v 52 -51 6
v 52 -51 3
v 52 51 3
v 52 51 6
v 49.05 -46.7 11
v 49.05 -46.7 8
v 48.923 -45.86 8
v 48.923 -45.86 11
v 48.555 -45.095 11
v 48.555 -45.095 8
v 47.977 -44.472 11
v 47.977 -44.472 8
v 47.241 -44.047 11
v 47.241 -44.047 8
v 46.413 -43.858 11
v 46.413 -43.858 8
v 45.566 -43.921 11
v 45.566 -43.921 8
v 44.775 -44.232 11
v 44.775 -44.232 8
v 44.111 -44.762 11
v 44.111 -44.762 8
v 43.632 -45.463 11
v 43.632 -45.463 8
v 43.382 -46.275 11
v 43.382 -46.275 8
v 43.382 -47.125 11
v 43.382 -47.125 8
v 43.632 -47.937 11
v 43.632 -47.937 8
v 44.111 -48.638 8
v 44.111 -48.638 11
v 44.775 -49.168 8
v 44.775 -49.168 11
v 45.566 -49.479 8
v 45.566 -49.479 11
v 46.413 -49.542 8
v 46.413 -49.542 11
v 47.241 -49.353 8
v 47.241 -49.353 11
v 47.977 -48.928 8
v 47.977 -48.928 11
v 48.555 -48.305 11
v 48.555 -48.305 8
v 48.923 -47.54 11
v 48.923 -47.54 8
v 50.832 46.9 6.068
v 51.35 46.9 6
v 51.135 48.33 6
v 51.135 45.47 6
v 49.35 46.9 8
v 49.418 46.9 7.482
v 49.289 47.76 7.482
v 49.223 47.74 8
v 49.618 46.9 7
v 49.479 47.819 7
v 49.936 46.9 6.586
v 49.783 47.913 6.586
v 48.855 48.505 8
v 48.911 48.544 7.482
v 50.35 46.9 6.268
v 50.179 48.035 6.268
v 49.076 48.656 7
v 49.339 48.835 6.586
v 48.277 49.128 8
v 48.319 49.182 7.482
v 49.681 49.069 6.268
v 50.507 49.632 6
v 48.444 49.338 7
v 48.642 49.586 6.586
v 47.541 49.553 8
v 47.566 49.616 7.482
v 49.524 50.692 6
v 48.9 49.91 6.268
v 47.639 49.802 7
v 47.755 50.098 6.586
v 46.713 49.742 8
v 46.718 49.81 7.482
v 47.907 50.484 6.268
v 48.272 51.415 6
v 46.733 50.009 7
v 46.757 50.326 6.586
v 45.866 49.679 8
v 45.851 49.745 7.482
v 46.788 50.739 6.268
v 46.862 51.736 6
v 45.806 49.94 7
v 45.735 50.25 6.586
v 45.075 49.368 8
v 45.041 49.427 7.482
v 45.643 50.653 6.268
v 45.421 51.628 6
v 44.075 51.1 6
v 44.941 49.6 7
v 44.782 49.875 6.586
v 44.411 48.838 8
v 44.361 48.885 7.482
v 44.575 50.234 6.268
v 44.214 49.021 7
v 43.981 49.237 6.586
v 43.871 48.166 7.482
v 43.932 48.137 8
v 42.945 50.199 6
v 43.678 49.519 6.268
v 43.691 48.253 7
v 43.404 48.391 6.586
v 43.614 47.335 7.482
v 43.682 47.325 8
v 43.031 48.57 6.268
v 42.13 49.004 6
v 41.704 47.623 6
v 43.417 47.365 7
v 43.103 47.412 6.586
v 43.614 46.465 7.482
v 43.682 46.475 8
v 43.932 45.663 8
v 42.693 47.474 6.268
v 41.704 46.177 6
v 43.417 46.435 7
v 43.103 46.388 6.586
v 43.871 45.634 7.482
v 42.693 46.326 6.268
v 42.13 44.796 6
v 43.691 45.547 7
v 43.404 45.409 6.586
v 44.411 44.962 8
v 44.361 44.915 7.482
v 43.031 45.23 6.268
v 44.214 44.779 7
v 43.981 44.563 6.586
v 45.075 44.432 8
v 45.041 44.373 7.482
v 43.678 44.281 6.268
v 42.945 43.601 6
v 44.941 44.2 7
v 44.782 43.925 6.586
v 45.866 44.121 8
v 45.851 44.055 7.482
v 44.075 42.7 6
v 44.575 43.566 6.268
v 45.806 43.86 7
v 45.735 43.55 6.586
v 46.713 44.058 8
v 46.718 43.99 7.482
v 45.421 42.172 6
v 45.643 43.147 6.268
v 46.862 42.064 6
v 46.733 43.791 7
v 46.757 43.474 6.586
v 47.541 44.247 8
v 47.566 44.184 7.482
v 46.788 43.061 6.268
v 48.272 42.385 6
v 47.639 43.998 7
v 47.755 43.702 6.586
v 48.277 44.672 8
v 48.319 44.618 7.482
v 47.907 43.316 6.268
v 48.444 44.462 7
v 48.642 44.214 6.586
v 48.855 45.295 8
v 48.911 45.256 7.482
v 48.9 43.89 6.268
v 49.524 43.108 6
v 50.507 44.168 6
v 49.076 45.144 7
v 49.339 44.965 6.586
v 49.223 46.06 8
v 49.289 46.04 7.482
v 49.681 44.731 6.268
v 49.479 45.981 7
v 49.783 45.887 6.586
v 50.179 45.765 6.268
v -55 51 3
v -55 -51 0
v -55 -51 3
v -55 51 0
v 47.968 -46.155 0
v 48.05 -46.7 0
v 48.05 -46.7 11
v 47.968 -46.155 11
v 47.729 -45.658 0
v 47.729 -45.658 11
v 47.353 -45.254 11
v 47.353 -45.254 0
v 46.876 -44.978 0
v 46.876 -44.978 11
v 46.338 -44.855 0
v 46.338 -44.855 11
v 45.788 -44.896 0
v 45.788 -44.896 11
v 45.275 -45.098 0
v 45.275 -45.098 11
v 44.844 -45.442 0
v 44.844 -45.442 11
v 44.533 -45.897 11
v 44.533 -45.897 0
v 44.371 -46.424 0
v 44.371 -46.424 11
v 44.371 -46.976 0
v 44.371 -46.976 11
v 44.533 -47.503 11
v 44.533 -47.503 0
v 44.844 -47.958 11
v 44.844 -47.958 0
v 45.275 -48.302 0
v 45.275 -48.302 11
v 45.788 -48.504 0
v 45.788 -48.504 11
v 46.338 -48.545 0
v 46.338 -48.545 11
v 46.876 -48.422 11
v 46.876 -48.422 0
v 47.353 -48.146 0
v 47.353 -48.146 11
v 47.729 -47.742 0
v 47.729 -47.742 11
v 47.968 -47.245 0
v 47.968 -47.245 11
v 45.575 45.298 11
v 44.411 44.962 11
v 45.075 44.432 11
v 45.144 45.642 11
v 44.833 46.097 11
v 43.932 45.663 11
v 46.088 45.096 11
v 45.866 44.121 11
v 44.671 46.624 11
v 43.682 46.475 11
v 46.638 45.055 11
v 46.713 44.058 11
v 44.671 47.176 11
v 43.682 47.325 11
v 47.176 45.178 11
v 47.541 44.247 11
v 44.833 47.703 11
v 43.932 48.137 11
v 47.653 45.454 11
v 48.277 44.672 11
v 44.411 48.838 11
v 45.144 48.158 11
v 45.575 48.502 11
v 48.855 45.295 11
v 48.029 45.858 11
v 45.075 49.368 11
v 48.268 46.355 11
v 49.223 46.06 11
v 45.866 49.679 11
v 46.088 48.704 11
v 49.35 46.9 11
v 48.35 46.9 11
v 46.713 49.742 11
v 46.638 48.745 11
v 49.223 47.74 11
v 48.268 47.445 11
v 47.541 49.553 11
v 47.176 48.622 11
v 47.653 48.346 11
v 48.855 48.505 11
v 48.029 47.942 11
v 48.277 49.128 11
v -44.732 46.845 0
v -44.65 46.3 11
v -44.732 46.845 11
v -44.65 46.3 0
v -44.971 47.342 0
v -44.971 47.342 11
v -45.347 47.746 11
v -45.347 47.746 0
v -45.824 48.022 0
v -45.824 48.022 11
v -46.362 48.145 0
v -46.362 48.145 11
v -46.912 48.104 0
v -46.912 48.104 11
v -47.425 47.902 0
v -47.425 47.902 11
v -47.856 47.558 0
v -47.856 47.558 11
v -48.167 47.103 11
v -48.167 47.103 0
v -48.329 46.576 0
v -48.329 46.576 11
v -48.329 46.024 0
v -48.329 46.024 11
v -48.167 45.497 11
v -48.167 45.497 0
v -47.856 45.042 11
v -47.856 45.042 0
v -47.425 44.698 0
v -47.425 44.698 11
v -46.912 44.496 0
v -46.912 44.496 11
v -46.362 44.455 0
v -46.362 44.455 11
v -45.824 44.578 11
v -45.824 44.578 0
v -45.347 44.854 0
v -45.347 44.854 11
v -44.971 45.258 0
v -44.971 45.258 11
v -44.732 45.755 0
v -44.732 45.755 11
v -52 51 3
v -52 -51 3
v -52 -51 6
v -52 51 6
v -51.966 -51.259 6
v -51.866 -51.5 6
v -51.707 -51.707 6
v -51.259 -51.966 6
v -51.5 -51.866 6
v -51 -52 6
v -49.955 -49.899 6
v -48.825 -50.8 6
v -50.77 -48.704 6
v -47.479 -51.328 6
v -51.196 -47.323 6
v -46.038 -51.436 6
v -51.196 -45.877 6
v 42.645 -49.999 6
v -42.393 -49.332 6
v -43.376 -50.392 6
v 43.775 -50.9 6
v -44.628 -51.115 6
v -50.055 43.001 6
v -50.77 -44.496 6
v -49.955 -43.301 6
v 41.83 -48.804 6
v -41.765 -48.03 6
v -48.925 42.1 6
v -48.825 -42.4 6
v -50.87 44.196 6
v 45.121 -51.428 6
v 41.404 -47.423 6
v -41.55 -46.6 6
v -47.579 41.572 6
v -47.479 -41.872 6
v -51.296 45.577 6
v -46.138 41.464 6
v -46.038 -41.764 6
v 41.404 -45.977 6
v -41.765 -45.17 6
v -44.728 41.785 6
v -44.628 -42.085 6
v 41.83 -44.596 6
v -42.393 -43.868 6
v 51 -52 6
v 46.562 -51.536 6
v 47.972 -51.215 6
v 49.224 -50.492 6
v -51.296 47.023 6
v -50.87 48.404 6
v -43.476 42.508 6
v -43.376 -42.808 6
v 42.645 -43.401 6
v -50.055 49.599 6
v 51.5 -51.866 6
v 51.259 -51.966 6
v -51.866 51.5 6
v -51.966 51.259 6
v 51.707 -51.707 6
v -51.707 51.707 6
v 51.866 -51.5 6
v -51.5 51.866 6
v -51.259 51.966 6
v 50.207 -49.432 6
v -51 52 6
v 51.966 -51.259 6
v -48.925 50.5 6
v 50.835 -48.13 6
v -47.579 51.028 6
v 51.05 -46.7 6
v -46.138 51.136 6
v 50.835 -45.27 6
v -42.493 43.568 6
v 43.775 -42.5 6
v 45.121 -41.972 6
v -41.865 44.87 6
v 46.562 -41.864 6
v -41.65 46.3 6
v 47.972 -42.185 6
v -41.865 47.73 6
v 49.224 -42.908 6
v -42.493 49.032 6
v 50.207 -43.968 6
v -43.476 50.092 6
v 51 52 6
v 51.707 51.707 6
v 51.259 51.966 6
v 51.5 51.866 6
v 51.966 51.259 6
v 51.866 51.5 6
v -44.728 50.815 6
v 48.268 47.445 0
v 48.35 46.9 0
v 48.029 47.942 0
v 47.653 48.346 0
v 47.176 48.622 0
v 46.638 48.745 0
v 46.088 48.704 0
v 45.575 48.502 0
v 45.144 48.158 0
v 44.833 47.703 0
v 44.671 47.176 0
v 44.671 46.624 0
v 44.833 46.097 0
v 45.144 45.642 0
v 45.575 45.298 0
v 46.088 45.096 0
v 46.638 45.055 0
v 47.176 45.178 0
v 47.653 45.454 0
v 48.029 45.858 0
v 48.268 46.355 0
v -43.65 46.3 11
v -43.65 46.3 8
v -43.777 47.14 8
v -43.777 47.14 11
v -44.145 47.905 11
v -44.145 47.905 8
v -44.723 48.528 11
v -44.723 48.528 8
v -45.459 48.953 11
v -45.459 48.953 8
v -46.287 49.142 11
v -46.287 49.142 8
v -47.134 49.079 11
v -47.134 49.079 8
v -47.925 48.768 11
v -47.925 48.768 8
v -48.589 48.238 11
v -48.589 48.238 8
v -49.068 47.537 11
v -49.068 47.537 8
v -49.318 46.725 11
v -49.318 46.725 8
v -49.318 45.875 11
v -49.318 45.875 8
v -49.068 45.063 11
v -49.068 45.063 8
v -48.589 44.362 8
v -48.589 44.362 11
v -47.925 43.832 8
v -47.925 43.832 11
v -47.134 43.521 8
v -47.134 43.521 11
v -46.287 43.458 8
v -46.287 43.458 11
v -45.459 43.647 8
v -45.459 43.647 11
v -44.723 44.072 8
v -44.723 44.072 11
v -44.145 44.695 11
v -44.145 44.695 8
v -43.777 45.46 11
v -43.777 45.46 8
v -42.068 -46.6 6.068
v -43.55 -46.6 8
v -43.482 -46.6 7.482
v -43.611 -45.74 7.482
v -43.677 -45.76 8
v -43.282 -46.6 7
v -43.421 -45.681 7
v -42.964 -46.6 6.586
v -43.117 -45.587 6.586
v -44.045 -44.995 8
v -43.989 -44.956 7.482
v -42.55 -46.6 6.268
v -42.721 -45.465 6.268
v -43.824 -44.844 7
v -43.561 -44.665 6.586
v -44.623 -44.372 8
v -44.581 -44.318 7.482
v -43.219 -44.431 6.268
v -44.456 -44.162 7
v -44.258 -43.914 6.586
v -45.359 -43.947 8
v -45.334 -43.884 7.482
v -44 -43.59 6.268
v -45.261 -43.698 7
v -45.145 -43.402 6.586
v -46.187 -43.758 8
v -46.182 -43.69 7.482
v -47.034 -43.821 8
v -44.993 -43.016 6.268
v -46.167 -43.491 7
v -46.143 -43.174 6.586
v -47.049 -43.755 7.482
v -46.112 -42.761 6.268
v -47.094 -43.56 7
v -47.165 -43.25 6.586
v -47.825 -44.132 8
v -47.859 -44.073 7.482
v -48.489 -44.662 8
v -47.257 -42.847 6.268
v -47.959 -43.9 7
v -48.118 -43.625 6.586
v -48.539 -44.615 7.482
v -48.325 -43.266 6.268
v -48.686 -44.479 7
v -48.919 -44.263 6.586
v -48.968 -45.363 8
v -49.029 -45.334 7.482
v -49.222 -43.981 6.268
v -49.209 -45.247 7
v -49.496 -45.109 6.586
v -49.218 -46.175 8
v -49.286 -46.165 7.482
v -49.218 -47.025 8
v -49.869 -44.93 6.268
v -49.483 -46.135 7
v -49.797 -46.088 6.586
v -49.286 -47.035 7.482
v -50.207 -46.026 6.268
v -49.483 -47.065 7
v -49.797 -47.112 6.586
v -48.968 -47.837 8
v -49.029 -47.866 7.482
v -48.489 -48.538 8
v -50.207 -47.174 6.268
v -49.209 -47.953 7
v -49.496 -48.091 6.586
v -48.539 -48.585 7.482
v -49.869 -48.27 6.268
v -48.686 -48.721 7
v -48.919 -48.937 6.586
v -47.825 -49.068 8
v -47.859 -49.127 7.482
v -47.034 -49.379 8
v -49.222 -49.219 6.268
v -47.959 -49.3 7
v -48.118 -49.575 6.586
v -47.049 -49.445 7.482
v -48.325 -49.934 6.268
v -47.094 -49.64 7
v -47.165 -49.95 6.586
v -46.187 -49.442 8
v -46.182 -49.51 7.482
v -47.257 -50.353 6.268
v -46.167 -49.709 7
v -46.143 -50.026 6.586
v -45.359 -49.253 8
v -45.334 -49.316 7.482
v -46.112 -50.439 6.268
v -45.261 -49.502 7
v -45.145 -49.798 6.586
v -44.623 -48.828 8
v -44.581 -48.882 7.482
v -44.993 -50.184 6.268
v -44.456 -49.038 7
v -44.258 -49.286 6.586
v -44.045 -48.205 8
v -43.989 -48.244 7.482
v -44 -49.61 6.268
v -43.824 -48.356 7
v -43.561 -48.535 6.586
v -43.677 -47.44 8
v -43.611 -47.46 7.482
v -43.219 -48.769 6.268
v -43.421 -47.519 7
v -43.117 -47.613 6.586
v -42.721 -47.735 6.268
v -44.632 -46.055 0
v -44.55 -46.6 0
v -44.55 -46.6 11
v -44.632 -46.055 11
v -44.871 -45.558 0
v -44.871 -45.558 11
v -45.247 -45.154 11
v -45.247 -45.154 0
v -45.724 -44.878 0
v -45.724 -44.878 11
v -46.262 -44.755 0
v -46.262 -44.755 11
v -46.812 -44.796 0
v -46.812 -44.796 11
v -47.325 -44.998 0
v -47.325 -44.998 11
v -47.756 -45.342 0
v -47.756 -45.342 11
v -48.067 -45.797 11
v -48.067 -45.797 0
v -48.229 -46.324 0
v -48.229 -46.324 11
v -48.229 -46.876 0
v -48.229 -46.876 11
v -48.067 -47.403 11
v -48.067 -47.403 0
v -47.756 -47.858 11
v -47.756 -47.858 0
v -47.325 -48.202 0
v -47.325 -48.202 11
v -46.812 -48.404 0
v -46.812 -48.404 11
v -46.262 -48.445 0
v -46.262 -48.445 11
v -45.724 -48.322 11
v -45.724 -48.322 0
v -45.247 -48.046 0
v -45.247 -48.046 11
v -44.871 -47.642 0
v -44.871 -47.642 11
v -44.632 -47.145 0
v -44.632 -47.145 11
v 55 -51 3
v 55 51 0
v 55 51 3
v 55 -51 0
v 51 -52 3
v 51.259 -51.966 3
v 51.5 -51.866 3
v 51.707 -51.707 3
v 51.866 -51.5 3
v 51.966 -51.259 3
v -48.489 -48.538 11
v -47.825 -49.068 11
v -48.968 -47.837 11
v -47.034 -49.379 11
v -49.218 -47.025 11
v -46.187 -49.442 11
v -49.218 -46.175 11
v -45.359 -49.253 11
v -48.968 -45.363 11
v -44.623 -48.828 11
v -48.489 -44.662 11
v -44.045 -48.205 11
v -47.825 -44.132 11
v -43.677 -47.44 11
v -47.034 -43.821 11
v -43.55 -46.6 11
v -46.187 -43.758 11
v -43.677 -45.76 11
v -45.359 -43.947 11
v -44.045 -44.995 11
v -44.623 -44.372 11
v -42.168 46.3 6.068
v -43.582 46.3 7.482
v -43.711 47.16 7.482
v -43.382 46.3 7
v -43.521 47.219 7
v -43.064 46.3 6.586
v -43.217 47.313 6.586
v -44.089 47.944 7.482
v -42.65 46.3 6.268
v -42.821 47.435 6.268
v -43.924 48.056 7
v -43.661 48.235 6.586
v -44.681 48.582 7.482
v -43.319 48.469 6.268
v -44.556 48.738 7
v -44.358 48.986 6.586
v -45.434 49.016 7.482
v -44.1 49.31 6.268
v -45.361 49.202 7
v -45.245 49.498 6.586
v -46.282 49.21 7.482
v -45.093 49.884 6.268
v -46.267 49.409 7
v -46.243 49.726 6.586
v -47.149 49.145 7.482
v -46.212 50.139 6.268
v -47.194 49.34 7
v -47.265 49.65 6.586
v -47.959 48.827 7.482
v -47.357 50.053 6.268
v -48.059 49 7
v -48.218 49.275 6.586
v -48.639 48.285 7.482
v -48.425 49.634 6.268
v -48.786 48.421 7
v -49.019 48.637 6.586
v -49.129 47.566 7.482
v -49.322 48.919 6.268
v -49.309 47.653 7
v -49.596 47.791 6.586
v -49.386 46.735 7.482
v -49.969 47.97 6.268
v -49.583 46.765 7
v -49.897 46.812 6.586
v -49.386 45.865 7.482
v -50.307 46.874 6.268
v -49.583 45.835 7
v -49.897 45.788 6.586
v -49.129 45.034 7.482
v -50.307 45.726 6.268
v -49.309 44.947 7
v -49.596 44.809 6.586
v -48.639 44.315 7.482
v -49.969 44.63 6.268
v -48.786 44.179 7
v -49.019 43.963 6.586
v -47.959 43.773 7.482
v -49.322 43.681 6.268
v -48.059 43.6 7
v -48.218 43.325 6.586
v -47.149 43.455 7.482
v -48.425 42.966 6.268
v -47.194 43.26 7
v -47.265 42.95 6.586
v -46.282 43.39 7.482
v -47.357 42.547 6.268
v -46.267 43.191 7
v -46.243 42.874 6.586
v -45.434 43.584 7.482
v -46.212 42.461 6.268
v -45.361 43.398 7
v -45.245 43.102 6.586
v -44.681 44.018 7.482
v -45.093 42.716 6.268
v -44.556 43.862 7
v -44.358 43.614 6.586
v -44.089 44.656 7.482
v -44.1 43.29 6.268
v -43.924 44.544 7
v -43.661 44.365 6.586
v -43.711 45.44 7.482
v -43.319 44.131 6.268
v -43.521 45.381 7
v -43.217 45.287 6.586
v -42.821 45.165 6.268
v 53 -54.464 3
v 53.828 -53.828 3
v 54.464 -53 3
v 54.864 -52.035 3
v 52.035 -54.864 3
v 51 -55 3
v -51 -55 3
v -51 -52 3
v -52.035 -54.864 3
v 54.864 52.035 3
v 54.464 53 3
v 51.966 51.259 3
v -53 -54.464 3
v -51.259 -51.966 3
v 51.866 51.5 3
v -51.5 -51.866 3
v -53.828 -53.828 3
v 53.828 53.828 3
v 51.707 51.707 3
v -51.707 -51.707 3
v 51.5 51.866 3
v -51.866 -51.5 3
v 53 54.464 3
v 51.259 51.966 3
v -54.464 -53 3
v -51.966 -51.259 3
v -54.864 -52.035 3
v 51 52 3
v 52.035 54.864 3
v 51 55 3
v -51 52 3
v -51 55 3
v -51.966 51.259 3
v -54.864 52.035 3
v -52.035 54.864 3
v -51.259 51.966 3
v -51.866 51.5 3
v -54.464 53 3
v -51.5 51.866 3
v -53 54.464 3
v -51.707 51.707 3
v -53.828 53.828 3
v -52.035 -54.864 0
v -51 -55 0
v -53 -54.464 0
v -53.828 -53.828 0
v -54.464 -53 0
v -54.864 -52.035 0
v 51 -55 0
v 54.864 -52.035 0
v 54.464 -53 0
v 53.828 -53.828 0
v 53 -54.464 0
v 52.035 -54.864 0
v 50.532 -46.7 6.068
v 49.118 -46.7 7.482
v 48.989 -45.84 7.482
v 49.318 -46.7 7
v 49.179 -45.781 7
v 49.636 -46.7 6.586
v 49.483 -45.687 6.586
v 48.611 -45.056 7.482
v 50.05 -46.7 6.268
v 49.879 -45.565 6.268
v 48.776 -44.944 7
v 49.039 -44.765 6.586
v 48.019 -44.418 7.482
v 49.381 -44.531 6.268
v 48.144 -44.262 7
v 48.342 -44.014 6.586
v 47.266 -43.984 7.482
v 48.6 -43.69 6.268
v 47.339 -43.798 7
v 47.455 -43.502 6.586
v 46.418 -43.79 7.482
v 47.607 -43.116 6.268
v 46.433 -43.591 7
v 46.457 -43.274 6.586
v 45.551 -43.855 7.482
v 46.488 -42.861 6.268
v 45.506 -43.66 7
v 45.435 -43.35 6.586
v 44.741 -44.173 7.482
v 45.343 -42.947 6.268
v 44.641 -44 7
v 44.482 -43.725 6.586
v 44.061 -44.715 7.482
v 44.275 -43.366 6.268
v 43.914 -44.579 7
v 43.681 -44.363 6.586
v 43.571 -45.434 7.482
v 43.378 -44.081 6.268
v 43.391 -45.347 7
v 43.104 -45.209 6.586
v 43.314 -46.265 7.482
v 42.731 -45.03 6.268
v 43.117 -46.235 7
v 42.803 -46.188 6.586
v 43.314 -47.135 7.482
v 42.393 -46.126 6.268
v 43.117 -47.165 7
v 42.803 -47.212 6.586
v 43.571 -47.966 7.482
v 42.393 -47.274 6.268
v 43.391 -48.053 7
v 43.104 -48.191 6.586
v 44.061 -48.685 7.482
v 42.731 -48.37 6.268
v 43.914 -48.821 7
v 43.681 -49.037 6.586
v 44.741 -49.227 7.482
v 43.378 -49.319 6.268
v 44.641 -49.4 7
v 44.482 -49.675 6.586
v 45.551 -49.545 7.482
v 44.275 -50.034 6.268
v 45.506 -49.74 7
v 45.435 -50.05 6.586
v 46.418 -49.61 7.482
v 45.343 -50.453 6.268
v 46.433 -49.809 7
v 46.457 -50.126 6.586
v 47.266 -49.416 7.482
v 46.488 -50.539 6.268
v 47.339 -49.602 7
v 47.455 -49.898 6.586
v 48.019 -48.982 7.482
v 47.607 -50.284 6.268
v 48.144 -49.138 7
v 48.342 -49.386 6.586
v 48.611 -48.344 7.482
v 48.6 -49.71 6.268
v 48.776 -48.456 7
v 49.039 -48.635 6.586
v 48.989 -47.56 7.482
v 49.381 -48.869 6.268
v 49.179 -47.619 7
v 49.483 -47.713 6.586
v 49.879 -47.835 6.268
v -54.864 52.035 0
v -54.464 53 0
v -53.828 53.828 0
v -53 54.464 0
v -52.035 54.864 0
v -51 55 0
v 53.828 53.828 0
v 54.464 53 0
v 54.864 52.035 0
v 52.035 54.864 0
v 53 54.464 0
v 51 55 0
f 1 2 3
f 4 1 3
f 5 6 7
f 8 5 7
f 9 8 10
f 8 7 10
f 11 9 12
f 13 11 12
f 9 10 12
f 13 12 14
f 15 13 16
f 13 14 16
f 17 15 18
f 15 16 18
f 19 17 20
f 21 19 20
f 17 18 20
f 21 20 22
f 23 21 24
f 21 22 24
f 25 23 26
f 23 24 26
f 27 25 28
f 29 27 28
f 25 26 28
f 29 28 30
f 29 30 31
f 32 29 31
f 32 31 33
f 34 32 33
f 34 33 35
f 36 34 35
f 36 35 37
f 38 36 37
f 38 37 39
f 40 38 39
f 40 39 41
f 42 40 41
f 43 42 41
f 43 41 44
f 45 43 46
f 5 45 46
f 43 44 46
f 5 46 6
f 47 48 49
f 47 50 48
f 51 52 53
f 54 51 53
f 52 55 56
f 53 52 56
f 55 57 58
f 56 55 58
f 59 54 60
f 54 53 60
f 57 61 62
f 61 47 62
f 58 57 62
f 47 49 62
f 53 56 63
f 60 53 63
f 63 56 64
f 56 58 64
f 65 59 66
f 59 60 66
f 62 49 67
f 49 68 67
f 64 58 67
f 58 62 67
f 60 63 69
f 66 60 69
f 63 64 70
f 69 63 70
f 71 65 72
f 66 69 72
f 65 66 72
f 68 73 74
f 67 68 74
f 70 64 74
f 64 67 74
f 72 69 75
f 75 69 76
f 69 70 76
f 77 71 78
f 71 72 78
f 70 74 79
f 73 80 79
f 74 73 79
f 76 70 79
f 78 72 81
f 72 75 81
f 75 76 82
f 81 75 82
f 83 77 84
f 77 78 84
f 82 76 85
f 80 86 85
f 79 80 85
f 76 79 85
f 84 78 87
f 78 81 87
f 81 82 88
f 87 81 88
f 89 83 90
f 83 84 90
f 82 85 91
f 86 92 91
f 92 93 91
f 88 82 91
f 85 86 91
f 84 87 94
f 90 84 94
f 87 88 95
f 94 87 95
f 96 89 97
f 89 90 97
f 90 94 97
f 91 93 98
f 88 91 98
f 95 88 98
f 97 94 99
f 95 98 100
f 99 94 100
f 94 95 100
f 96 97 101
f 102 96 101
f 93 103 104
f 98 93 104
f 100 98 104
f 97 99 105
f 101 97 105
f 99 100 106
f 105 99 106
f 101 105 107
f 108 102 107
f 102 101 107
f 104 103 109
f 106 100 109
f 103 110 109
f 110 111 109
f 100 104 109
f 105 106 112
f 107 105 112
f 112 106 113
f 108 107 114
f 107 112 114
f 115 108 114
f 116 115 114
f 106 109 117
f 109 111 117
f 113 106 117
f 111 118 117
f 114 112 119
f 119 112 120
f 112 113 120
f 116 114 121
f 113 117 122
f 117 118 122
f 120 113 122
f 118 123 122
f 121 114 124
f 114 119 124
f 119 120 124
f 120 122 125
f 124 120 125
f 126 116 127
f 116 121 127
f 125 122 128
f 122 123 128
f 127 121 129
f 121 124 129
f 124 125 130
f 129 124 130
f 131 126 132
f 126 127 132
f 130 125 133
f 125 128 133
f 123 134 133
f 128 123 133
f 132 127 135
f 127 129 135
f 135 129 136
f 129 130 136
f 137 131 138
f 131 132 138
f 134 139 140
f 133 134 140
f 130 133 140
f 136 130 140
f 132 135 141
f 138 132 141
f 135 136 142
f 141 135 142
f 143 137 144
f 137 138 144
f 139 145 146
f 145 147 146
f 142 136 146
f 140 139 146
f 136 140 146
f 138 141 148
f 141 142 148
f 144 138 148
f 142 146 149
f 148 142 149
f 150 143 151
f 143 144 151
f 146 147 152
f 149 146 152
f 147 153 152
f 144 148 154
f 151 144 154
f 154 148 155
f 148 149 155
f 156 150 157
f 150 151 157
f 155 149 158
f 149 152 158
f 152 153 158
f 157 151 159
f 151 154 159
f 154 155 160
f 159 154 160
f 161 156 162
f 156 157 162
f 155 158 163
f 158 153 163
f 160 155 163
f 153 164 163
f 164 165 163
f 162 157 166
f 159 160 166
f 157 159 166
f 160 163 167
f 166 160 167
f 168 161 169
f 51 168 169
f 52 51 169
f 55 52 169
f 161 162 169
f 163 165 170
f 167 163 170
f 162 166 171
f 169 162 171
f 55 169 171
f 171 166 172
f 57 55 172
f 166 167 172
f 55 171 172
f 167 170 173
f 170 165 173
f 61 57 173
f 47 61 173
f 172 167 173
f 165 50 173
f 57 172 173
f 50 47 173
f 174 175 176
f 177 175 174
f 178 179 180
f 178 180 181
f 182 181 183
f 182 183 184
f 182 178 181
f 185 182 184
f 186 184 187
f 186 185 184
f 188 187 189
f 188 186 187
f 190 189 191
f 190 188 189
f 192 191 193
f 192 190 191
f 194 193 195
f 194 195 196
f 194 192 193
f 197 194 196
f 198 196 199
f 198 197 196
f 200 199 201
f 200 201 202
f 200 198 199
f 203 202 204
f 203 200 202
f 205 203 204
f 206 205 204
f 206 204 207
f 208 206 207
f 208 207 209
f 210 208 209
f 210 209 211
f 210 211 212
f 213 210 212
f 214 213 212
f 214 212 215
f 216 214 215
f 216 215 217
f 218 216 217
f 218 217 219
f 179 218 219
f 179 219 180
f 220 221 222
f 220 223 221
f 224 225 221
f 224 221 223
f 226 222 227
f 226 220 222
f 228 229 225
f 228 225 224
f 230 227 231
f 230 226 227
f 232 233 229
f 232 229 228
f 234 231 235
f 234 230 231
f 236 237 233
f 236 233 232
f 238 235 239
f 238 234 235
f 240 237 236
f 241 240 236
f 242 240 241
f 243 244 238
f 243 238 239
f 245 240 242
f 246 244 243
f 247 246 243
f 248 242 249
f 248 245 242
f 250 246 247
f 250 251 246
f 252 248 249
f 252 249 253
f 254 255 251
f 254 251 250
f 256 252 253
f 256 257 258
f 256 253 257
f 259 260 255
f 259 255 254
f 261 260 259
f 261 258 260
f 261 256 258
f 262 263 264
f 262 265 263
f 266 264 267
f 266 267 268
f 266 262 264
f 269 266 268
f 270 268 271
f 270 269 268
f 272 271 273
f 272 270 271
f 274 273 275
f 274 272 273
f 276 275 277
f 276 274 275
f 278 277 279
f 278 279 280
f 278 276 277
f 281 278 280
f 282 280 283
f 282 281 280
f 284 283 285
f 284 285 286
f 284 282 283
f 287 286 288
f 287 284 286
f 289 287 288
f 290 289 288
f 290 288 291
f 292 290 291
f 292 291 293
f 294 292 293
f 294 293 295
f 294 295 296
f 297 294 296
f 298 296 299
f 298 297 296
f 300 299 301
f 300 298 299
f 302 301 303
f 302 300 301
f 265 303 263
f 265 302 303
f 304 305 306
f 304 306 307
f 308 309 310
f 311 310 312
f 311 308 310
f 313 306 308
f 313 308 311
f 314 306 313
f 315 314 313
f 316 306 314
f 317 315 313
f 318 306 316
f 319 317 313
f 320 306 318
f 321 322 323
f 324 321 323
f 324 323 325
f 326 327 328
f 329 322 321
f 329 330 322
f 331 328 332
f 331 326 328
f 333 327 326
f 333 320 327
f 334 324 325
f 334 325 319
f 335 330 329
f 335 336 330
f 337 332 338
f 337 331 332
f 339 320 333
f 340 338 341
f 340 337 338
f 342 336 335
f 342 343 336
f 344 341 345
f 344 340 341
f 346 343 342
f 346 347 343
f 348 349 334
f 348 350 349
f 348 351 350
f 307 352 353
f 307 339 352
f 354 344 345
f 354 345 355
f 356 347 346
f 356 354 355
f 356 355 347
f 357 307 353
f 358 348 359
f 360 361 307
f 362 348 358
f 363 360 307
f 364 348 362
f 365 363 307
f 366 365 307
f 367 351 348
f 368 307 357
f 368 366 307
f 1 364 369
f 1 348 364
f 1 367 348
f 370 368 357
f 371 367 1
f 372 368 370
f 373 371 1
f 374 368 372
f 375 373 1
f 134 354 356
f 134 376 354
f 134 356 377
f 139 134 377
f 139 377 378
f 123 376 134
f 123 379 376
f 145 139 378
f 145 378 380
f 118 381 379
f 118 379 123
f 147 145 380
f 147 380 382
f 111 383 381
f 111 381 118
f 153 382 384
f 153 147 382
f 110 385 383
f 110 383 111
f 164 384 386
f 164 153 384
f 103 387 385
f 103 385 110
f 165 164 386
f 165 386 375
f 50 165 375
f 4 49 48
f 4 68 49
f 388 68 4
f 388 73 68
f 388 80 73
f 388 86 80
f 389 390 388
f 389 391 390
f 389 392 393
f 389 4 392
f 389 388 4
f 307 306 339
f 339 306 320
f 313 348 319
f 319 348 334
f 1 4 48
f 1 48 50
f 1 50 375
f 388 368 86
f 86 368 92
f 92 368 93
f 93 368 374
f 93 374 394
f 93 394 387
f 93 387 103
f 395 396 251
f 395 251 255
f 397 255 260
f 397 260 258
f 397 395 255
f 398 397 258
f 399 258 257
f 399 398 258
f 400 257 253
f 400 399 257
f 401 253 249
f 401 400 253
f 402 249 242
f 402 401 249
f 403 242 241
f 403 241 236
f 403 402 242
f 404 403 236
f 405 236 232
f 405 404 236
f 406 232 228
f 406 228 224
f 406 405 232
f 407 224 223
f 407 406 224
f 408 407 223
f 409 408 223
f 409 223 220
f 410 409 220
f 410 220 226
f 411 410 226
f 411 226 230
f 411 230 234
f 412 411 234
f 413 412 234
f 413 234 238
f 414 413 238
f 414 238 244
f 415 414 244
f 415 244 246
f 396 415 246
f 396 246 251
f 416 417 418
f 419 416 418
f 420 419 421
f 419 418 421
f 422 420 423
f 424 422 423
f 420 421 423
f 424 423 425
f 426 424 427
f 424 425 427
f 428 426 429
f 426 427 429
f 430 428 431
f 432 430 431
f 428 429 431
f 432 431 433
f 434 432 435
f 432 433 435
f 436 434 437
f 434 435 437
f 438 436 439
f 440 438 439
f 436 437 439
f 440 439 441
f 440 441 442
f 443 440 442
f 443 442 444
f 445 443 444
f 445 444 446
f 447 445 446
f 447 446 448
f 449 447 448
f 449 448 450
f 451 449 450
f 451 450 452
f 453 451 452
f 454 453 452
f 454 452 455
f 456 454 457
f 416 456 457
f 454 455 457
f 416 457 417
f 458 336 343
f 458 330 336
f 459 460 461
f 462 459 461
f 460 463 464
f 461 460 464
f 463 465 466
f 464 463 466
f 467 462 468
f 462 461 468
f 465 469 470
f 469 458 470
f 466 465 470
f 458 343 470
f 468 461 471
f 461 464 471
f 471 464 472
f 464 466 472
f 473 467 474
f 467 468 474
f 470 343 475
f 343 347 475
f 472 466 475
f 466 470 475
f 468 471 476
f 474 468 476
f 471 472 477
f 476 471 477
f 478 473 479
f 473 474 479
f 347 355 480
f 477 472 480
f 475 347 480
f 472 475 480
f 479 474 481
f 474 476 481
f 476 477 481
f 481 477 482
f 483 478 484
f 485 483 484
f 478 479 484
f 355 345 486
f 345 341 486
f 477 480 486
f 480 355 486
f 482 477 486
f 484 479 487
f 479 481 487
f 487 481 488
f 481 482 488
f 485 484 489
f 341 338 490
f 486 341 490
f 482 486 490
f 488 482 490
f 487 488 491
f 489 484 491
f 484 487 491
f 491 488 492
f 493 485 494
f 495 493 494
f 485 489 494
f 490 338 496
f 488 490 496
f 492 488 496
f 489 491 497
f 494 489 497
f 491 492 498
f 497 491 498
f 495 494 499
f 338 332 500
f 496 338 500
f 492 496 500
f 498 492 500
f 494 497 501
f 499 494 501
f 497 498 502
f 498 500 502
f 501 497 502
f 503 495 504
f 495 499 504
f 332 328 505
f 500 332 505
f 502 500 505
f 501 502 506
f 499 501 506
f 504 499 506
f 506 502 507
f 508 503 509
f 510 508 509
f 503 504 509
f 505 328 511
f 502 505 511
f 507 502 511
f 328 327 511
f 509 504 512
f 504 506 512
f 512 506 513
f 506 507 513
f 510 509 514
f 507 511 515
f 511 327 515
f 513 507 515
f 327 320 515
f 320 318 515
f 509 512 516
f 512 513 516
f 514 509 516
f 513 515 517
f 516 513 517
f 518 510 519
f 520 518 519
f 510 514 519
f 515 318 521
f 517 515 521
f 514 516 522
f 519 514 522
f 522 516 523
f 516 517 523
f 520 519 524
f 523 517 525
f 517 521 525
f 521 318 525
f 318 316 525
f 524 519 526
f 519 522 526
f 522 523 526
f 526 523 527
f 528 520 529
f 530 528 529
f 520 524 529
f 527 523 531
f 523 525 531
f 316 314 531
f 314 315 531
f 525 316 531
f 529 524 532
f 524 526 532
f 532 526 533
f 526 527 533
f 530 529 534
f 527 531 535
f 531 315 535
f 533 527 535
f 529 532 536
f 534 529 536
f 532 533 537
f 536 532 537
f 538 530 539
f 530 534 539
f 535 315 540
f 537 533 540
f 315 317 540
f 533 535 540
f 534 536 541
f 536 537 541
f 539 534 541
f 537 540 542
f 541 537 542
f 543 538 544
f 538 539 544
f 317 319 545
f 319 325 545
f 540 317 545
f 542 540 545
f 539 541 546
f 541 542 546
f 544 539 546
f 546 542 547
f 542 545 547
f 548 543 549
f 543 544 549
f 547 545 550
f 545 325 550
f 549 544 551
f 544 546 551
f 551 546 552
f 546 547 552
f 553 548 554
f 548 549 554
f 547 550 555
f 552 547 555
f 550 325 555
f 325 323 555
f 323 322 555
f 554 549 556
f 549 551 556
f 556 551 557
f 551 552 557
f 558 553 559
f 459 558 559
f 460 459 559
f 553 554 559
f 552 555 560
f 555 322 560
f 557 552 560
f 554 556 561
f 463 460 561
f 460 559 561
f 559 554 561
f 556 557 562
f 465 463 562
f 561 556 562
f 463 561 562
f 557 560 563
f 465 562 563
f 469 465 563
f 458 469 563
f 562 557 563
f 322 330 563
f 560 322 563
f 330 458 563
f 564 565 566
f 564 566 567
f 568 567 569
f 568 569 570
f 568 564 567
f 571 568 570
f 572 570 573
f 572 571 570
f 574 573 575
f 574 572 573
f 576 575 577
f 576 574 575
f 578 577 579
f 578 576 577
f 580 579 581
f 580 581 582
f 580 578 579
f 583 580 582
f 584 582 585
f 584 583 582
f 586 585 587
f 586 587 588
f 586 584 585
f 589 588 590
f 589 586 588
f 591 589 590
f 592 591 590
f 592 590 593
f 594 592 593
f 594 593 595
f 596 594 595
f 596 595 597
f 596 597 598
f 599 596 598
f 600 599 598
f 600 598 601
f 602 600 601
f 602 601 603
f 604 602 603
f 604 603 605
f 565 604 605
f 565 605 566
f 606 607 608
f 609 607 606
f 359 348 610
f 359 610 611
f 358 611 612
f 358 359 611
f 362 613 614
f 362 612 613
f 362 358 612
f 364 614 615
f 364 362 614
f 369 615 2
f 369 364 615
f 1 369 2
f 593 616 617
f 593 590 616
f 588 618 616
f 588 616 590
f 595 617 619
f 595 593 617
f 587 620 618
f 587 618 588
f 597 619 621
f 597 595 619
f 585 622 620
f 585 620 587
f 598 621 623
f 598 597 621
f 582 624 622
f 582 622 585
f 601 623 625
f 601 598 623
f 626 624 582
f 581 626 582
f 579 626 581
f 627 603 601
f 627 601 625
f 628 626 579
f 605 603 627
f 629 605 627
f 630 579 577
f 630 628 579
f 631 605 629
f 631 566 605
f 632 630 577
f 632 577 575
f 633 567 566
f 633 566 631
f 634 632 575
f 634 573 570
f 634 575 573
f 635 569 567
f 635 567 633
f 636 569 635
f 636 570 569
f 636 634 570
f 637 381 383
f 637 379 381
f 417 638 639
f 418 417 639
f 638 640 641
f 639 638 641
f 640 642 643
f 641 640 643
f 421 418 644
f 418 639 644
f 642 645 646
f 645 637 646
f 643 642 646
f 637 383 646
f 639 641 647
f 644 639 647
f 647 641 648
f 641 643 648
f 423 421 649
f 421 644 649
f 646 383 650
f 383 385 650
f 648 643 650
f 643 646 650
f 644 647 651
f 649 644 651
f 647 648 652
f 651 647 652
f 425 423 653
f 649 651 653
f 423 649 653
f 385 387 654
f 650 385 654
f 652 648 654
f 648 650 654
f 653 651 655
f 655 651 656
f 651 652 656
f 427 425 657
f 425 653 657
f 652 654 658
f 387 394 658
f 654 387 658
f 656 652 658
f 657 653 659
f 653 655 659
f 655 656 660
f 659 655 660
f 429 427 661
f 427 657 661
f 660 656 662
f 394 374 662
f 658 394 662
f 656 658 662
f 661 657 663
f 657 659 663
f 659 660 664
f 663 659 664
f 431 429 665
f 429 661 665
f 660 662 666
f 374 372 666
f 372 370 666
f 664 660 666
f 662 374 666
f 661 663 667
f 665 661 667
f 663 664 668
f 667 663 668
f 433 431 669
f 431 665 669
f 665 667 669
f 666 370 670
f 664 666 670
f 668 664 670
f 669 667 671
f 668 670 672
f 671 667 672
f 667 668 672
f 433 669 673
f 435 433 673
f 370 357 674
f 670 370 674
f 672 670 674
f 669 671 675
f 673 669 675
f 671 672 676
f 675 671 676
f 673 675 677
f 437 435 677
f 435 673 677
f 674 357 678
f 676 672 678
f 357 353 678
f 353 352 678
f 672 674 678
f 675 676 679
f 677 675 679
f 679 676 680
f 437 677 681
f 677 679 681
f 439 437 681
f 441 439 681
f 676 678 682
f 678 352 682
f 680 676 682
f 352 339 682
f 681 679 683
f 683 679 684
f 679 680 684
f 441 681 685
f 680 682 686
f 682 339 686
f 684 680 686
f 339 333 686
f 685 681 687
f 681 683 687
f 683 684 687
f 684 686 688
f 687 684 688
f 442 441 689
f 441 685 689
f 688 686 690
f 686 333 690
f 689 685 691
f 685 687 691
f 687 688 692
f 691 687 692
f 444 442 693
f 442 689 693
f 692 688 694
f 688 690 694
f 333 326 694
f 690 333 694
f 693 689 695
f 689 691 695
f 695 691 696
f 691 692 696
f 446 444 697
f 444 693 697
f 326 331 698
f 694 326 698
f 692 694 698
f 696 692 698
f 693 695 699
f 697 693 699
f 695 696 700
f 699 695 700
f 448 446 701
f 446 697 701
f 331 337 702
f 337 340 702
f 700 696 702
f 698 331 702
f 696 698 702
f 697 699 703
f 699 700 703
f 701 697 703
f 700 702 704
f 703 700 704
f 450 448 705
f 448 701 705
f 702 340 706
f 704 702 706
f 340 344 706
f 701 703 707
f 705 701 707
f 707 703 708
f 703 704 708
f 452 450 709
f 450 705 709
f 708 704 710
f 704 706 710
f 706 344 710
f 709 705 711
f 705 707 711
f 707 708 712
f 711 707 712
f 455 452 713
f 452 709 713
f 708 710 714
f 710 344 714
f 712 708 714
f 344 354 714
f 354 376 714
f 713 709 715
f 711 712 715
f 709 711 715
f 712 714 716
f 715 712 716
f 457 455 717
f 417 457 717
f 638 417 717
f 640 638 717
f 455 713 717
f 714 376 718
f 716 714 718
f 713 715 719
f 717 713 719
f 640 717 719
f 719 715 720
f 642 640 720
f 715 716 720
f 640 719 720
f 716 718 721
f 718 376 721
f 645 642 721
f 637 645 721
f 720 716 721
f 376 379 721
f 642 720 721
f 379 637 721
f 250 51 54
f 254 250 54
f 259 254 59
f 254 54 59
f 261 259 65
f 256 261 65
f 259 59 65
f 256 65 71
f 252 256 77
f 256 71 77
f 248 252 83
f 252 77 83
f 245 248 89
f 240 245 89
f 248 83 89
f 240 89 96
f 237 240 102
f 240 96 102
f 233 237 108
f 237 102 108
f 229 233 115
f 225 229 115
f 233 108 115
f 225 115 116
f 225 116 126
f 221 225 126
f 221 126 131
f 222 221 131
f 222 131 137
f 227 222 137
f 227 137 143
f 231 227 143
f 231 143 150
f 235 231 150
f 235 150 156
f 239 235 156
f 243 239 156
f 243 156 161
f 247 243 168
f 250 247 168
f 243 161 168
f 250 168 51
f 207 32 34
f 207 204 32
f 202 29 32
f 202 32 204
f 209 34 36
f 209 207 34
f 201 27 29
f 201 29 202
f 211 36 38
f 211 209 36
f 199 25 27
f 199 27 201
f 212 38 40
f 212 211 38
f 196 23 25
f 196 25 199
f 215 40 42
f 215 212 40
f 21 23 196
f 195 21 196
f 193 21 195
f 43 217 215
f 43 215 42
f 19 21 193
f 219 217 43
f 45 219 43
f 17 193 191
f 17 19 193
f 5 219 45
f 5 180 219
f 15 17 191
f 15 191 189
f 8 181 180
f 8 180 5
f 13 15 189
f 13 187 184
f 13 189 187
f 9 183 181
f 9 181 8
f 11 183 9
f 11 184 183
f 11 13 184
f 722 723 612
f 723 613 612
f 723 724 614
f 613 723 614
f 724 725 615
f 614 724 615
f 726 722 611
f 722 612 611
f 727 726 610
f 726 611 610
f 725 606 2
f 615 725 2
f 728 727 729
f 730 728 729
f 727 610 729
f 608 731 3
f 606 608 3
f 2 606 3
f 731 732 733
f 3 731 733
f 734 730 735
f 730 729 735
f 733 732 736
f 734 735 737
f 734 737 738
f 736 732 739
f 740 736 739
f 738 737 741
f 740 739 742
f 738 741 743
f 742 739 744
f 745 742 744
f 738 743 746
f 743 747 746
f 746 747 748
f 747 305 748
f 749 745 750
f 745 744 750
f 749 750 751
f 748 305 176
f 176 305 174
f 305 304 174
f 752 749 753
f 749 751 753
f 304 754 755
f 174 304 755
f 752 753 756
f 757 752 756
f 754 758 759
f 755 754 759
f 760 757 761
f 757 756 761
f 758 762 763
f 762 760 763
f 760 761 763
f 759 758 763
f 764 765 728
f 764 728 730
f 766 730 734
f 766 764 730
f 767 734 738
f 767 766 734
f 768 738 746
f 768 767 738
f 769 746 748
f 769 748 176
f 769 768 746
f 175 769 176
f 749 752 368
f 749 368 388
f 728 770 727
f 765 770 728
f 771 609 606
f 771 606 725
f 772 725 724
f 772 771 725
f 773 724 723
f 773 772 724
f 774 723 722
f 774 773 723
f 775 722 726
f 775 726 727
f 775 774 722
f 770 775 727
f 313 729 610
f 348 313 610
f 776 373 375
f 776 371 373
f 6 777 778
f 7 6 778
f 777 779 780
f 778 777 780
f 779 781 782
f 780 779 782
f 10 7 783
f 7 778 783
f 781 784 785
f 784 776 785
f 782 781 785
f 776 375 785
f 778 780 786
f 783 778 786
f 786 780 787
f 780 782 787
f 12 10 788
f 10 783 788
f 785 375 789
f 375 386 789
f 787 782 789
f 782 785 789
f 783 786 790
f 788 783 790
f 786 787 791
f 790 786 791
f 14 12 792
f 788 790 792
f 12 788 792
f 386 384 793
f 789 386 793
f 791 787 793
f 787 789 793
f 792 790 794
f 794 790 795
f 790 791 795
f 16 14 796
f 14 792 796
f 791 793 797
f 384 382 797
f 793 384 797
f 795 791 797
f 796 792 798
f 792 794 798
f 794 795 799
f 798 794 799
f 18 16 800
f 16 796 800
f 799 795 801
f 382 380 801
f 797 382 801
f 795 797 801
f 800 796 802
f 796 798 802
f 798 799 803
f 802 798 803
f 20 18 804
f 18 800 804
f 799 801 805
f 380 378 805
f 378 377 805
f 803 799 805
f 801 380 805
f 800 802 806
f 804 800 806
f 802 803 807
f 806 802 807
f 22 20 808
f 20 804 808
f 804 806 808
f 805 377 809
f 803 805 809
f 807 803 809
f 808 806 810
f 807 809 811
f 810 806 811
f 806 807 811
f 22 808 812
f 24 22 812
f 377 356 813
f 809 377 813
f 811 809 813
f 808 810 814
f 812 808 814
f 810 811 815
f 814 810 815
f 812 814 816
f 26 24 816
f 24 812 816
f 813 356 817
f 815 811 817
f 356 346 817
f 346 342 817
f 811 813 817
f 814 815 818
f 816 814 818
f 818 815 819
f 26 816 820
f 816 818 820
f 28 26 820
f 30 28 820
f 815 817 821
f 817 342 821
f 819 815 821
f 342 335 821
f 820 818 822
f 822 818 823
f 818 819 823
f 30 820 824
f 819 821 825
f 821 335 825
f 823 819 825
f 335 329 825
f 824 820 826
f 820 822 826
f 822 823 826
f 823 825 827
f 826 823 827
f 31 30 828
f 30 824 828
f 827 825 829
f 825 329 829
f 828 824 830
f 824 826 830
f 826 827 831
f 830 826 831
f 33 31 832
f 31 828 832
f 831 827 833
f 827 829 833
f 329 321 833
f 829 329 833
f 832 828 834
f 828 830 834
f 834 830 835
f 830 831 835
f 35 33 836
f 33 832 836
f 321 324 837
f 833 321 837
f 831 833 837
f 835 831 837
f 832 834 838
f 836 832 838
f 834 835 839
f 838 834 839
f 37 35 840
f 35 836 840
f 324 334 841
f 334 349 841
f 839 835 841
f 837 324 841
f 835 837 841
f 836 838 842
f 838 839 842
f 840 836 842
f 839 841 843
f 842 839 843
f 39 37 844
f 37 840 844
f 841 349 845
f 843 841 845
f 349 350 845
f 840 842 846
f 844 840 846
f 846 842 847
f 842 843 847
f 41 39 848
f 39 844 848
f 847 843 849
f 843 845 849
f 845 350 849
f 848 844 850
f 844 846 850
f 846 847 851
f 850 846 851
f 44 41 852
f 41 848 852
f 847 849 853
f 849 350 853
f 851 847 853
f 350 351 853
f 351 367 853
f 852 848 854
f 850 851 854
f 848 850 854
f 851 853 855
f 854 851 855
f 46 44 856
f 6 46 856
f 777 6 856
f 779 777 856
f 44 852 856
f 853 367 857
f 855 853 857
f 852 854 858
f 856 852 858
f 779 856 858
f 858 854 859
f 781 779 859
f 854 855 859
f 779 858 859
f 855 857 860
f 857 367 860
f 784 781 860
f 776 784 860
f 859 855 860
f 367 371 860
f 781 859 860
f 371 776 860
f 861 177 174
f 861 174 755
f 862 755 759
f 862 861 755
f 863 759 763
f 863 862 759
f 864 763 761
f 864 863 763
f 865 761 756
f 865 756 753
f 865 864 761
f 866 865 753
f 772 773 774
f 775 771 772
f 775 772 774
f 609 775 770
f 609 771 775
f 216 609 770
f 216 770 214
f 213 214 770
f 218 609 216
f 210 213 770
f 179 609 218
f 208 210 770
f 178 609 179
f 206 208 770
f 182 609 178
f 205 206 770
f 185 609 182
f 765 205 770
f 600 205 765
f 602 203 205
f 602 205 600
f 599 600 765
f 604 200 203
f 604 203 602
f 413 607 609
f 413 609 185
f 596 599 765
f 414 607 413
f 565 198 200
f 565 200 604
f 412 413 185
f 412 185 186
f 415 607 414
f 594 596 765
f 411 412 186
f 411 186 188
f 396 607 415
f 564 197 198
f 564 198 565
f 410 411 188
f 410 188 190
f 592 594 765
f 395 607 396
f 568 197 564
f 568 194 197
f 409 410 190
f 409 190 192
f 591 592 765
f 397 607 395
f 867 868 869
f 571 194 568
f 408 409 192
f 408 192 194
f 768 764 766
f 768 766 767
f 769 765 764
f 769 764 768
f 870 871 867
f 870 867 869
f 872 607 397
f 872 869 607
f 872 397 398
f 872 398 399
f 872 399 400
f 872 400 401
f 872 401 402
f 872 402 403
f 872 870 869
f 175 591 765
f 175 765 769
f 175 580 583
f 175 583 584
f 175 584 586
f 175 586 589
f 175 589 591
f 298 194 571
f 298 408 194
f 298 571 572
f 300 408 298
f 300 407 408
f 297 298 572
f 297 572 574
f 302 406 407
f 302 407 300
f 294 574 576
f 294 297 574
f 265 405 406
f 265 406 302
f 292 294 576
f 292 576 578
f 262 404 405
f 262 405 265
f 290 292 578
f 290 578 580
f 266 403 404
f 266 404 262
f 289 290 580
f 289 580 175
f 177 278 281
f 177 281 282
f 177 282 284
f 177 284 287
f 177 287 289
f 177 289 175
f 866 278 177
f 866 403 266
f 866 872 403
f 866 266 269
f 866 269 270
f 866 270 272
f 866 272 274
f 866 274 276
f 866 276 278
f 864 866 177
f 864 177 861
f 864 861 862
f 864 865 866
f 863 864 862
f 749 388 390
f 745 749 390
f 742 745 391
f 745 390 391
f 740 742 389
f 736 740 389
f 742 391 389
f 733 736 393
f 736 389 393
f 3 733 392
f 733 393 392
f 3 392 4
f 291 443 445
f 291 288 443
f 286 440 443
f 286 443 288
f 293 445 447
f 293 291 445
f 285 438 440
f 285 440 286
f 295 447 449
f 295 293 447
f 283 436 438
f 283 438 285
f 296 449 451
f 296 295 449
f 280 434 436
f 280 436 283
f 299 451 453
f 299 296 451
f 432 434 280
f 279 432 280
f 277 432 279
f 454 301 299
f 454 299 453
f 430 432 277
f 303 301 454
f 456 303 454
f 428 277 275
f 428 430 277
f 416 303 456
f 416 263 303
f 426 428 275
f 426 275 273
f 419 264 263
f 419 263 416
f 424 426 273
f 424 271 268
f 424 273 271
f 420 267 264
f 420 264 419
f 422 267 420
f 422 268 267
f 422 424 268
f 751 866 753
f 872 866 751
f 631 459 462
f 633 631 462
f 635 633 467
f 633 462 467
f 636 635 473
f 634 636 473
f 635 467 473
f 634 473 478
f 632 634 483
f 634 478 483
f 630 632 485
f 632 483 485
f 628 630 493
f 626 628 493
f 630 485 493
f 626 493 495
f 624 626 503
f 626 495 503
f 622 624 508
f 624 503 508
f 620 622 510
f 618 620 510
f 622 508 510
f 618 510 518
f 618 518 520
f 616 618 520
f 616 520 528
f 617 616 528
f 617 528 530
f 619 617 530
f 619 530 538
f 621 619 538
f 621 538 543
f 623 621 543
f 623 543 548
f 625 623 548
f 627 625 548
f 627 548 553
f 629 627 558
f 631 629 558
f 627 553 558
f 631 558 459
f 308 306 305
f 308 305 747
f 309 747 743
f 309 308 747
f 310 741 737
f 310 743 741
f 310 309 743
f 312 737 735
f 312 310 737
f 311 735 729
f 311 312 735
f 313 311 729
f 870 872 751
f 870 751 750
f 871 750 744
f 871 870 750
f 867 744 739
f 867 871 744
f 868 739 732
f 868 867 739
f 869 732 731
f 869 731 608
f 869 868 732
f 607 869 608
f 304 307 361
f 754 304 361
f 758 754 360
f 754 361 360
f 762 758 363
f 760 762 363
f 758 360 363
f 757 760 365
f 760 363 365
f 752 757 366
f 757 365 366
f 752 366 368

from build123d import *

# Parameters (mm, degrees)
CROQUIS4_W              = 104
CROQUIS4_H              = 104
CROQUIS4_R              = 1.85
SALIENTE_EXTRUIR2_DEPTH = 6
CROQUIS5_R              = 2.85
CROQUIS5_R_2            = 1.85
SALIENTE_EXTRUIR3_DEPTH = 5
REDONDEO1_R             = 2
REDONDEO2_R             = 1
SALIENTE_EXTRUIR4_START = -3
SALIENTE_EXTRUIR4_DEPTH = 3


with BuildPart() as part:
    # Croquis4 → Saliente-Extruir2 (new body)
    with BuildSketch(Plane.XY):
        Rectangle(CROQUIS4_W, CROQUIS4_H)
        with Locations((-46.4, -46.6)):
            Circle(CROQUIS4_R, mode=Mode.SUBTRACT)
        with Locations((46.2, -46.7)):
            Circle(CROQUIS4_R, mode=Mode.SUBTRACT)
        with Locations((-46.5, 46.3)):
            Circle(CROQUIS4_R, mode=Mode.SUBTRACT)
        with Locations((46.5, 46.9)):
            Circle(CROQUIS4_R, mode=Mode.SUBTRACT)
    extrude(amount=SALIENTE_EXTRUIR2_DEPTH)

    # Croquis5 → Saliente-Extruir3 (add)
    # profile 1 of 4: a face of its own
    with BuildSketch(Plane.XY.offset(6)):
        with Locations((-46.5, 46.3)):
            Circle(CROQUIS5_R)
        with Locations((-46.5, 46.3)):
            Circle(CROQUIS5_R_2, mode=Mode.SUBTRACT)
    # profile 2 of 4: a face of its own
    with BuildSketch(Plane.XY.offset(6)):
        with Locations((46.5, 46.9)):
            Circle(CROQUIS5_R)
        with Locations((46.5, 46.9)):
            Circle(CROQUIS5_R_2, mode=Mode.SUBTRACT)
    # profile 3 of 4: a face of its own
    with BuildSketch(Plane.XY.offset(6)):
        with Locations((46.2, -46.7)):
            Circle(CROQUIS5_R)
        with Locations((46.2, -46.7)):
            Circle(CROQUIS5_R_2, mode=Mode.SUBTRACT)
    # profile 4 of 4: a face of its own
    with BuildSketch(Plane.XY.offset(6)):
        with Locations((-46.4, -46.6)):
            Circle(CROQUIS5_R)
        with Locations((-46.4, -46.6)):
            Circle(CROQUIS5_R_2, mode=Mode.SUBTRACT)
    extrude(amount=SALIENTE_EXTRUIR3_DEPTH)

    # Redondeo1
    redondeo1_edges = [part.edges().sort_by_distance(p)[0] for p in [
        (43.35, -46.7, 6),
        (-49.25, -46.6, 6),
        (-49.35, 46.3, 6),
        (43.65, 46.9, 6),
    ]]
    fillet(redondeo1_edges, radius=REDONDEO1_R)

    # Redondeo2
    redondeo2_edges = [part.edges().sort_by_distance(p)[0] for p in [
        (52, -52, 3),
        (-52, -52, 3),
        (-52, 52, 3),
        (52, 52, 3),
    ]]
    fillet(redondeo2_edges, radius=REDONDEO2_R)

    # Croquis6 → Saliente-Extruir4 (add)
    with BuildSketch(Plane(origin=(0, 0, 0), x_dir=(-1, 0, 0), z_dir=(0, 0, -1)).offset(SALIENTE_EXTRUIR4_START)):
        with BuildLine():
            Line((51, 55), (-51, 55))
            ThreePointArc((-51, 55), (-53.828427125, 53.828427125), (-55, 51))
            Line((-55, 51), (-55, -51))
            ThreePointArc((-55, -51), (-53.828427125, -53.828427125), (-51, -55))
            Line((-51, -55), (51, -55))
            ThreePointArc((51, -55), (53.828427125, -53.828427125), (55, -51))
            Line((55, -51), (55, 51))
            ThreePointArc((55, 51), (53.828427125, 53.828427125), (51, 55))
        make_face()
        with BuildLine():
            Line((-52, 51), (-52, -51))
            ThreePointArc((-52, -51), (-51.707106781, -51.707106781), (-51, -52))
            Line((-51, -52), (51, -52))
            ThreePointArc((51, -52), (51.707106781, -51.707106781), (52, -51))
            Line((52, -51), (52, 51))
            ThreePointArc((52, 51), (51.707106781, 51.707106781), (51, 52))
            Line((51, 52), (-51, 52))
            ThreePointArc((-51, 52), (-51.707106781, 51.707106781), (-52, 51))
        make_face(mode=Mode.SUBTRACT)
    extrude(amount=SALIENTE_EXTRUIR4_DEPTH)


solid = part.part
